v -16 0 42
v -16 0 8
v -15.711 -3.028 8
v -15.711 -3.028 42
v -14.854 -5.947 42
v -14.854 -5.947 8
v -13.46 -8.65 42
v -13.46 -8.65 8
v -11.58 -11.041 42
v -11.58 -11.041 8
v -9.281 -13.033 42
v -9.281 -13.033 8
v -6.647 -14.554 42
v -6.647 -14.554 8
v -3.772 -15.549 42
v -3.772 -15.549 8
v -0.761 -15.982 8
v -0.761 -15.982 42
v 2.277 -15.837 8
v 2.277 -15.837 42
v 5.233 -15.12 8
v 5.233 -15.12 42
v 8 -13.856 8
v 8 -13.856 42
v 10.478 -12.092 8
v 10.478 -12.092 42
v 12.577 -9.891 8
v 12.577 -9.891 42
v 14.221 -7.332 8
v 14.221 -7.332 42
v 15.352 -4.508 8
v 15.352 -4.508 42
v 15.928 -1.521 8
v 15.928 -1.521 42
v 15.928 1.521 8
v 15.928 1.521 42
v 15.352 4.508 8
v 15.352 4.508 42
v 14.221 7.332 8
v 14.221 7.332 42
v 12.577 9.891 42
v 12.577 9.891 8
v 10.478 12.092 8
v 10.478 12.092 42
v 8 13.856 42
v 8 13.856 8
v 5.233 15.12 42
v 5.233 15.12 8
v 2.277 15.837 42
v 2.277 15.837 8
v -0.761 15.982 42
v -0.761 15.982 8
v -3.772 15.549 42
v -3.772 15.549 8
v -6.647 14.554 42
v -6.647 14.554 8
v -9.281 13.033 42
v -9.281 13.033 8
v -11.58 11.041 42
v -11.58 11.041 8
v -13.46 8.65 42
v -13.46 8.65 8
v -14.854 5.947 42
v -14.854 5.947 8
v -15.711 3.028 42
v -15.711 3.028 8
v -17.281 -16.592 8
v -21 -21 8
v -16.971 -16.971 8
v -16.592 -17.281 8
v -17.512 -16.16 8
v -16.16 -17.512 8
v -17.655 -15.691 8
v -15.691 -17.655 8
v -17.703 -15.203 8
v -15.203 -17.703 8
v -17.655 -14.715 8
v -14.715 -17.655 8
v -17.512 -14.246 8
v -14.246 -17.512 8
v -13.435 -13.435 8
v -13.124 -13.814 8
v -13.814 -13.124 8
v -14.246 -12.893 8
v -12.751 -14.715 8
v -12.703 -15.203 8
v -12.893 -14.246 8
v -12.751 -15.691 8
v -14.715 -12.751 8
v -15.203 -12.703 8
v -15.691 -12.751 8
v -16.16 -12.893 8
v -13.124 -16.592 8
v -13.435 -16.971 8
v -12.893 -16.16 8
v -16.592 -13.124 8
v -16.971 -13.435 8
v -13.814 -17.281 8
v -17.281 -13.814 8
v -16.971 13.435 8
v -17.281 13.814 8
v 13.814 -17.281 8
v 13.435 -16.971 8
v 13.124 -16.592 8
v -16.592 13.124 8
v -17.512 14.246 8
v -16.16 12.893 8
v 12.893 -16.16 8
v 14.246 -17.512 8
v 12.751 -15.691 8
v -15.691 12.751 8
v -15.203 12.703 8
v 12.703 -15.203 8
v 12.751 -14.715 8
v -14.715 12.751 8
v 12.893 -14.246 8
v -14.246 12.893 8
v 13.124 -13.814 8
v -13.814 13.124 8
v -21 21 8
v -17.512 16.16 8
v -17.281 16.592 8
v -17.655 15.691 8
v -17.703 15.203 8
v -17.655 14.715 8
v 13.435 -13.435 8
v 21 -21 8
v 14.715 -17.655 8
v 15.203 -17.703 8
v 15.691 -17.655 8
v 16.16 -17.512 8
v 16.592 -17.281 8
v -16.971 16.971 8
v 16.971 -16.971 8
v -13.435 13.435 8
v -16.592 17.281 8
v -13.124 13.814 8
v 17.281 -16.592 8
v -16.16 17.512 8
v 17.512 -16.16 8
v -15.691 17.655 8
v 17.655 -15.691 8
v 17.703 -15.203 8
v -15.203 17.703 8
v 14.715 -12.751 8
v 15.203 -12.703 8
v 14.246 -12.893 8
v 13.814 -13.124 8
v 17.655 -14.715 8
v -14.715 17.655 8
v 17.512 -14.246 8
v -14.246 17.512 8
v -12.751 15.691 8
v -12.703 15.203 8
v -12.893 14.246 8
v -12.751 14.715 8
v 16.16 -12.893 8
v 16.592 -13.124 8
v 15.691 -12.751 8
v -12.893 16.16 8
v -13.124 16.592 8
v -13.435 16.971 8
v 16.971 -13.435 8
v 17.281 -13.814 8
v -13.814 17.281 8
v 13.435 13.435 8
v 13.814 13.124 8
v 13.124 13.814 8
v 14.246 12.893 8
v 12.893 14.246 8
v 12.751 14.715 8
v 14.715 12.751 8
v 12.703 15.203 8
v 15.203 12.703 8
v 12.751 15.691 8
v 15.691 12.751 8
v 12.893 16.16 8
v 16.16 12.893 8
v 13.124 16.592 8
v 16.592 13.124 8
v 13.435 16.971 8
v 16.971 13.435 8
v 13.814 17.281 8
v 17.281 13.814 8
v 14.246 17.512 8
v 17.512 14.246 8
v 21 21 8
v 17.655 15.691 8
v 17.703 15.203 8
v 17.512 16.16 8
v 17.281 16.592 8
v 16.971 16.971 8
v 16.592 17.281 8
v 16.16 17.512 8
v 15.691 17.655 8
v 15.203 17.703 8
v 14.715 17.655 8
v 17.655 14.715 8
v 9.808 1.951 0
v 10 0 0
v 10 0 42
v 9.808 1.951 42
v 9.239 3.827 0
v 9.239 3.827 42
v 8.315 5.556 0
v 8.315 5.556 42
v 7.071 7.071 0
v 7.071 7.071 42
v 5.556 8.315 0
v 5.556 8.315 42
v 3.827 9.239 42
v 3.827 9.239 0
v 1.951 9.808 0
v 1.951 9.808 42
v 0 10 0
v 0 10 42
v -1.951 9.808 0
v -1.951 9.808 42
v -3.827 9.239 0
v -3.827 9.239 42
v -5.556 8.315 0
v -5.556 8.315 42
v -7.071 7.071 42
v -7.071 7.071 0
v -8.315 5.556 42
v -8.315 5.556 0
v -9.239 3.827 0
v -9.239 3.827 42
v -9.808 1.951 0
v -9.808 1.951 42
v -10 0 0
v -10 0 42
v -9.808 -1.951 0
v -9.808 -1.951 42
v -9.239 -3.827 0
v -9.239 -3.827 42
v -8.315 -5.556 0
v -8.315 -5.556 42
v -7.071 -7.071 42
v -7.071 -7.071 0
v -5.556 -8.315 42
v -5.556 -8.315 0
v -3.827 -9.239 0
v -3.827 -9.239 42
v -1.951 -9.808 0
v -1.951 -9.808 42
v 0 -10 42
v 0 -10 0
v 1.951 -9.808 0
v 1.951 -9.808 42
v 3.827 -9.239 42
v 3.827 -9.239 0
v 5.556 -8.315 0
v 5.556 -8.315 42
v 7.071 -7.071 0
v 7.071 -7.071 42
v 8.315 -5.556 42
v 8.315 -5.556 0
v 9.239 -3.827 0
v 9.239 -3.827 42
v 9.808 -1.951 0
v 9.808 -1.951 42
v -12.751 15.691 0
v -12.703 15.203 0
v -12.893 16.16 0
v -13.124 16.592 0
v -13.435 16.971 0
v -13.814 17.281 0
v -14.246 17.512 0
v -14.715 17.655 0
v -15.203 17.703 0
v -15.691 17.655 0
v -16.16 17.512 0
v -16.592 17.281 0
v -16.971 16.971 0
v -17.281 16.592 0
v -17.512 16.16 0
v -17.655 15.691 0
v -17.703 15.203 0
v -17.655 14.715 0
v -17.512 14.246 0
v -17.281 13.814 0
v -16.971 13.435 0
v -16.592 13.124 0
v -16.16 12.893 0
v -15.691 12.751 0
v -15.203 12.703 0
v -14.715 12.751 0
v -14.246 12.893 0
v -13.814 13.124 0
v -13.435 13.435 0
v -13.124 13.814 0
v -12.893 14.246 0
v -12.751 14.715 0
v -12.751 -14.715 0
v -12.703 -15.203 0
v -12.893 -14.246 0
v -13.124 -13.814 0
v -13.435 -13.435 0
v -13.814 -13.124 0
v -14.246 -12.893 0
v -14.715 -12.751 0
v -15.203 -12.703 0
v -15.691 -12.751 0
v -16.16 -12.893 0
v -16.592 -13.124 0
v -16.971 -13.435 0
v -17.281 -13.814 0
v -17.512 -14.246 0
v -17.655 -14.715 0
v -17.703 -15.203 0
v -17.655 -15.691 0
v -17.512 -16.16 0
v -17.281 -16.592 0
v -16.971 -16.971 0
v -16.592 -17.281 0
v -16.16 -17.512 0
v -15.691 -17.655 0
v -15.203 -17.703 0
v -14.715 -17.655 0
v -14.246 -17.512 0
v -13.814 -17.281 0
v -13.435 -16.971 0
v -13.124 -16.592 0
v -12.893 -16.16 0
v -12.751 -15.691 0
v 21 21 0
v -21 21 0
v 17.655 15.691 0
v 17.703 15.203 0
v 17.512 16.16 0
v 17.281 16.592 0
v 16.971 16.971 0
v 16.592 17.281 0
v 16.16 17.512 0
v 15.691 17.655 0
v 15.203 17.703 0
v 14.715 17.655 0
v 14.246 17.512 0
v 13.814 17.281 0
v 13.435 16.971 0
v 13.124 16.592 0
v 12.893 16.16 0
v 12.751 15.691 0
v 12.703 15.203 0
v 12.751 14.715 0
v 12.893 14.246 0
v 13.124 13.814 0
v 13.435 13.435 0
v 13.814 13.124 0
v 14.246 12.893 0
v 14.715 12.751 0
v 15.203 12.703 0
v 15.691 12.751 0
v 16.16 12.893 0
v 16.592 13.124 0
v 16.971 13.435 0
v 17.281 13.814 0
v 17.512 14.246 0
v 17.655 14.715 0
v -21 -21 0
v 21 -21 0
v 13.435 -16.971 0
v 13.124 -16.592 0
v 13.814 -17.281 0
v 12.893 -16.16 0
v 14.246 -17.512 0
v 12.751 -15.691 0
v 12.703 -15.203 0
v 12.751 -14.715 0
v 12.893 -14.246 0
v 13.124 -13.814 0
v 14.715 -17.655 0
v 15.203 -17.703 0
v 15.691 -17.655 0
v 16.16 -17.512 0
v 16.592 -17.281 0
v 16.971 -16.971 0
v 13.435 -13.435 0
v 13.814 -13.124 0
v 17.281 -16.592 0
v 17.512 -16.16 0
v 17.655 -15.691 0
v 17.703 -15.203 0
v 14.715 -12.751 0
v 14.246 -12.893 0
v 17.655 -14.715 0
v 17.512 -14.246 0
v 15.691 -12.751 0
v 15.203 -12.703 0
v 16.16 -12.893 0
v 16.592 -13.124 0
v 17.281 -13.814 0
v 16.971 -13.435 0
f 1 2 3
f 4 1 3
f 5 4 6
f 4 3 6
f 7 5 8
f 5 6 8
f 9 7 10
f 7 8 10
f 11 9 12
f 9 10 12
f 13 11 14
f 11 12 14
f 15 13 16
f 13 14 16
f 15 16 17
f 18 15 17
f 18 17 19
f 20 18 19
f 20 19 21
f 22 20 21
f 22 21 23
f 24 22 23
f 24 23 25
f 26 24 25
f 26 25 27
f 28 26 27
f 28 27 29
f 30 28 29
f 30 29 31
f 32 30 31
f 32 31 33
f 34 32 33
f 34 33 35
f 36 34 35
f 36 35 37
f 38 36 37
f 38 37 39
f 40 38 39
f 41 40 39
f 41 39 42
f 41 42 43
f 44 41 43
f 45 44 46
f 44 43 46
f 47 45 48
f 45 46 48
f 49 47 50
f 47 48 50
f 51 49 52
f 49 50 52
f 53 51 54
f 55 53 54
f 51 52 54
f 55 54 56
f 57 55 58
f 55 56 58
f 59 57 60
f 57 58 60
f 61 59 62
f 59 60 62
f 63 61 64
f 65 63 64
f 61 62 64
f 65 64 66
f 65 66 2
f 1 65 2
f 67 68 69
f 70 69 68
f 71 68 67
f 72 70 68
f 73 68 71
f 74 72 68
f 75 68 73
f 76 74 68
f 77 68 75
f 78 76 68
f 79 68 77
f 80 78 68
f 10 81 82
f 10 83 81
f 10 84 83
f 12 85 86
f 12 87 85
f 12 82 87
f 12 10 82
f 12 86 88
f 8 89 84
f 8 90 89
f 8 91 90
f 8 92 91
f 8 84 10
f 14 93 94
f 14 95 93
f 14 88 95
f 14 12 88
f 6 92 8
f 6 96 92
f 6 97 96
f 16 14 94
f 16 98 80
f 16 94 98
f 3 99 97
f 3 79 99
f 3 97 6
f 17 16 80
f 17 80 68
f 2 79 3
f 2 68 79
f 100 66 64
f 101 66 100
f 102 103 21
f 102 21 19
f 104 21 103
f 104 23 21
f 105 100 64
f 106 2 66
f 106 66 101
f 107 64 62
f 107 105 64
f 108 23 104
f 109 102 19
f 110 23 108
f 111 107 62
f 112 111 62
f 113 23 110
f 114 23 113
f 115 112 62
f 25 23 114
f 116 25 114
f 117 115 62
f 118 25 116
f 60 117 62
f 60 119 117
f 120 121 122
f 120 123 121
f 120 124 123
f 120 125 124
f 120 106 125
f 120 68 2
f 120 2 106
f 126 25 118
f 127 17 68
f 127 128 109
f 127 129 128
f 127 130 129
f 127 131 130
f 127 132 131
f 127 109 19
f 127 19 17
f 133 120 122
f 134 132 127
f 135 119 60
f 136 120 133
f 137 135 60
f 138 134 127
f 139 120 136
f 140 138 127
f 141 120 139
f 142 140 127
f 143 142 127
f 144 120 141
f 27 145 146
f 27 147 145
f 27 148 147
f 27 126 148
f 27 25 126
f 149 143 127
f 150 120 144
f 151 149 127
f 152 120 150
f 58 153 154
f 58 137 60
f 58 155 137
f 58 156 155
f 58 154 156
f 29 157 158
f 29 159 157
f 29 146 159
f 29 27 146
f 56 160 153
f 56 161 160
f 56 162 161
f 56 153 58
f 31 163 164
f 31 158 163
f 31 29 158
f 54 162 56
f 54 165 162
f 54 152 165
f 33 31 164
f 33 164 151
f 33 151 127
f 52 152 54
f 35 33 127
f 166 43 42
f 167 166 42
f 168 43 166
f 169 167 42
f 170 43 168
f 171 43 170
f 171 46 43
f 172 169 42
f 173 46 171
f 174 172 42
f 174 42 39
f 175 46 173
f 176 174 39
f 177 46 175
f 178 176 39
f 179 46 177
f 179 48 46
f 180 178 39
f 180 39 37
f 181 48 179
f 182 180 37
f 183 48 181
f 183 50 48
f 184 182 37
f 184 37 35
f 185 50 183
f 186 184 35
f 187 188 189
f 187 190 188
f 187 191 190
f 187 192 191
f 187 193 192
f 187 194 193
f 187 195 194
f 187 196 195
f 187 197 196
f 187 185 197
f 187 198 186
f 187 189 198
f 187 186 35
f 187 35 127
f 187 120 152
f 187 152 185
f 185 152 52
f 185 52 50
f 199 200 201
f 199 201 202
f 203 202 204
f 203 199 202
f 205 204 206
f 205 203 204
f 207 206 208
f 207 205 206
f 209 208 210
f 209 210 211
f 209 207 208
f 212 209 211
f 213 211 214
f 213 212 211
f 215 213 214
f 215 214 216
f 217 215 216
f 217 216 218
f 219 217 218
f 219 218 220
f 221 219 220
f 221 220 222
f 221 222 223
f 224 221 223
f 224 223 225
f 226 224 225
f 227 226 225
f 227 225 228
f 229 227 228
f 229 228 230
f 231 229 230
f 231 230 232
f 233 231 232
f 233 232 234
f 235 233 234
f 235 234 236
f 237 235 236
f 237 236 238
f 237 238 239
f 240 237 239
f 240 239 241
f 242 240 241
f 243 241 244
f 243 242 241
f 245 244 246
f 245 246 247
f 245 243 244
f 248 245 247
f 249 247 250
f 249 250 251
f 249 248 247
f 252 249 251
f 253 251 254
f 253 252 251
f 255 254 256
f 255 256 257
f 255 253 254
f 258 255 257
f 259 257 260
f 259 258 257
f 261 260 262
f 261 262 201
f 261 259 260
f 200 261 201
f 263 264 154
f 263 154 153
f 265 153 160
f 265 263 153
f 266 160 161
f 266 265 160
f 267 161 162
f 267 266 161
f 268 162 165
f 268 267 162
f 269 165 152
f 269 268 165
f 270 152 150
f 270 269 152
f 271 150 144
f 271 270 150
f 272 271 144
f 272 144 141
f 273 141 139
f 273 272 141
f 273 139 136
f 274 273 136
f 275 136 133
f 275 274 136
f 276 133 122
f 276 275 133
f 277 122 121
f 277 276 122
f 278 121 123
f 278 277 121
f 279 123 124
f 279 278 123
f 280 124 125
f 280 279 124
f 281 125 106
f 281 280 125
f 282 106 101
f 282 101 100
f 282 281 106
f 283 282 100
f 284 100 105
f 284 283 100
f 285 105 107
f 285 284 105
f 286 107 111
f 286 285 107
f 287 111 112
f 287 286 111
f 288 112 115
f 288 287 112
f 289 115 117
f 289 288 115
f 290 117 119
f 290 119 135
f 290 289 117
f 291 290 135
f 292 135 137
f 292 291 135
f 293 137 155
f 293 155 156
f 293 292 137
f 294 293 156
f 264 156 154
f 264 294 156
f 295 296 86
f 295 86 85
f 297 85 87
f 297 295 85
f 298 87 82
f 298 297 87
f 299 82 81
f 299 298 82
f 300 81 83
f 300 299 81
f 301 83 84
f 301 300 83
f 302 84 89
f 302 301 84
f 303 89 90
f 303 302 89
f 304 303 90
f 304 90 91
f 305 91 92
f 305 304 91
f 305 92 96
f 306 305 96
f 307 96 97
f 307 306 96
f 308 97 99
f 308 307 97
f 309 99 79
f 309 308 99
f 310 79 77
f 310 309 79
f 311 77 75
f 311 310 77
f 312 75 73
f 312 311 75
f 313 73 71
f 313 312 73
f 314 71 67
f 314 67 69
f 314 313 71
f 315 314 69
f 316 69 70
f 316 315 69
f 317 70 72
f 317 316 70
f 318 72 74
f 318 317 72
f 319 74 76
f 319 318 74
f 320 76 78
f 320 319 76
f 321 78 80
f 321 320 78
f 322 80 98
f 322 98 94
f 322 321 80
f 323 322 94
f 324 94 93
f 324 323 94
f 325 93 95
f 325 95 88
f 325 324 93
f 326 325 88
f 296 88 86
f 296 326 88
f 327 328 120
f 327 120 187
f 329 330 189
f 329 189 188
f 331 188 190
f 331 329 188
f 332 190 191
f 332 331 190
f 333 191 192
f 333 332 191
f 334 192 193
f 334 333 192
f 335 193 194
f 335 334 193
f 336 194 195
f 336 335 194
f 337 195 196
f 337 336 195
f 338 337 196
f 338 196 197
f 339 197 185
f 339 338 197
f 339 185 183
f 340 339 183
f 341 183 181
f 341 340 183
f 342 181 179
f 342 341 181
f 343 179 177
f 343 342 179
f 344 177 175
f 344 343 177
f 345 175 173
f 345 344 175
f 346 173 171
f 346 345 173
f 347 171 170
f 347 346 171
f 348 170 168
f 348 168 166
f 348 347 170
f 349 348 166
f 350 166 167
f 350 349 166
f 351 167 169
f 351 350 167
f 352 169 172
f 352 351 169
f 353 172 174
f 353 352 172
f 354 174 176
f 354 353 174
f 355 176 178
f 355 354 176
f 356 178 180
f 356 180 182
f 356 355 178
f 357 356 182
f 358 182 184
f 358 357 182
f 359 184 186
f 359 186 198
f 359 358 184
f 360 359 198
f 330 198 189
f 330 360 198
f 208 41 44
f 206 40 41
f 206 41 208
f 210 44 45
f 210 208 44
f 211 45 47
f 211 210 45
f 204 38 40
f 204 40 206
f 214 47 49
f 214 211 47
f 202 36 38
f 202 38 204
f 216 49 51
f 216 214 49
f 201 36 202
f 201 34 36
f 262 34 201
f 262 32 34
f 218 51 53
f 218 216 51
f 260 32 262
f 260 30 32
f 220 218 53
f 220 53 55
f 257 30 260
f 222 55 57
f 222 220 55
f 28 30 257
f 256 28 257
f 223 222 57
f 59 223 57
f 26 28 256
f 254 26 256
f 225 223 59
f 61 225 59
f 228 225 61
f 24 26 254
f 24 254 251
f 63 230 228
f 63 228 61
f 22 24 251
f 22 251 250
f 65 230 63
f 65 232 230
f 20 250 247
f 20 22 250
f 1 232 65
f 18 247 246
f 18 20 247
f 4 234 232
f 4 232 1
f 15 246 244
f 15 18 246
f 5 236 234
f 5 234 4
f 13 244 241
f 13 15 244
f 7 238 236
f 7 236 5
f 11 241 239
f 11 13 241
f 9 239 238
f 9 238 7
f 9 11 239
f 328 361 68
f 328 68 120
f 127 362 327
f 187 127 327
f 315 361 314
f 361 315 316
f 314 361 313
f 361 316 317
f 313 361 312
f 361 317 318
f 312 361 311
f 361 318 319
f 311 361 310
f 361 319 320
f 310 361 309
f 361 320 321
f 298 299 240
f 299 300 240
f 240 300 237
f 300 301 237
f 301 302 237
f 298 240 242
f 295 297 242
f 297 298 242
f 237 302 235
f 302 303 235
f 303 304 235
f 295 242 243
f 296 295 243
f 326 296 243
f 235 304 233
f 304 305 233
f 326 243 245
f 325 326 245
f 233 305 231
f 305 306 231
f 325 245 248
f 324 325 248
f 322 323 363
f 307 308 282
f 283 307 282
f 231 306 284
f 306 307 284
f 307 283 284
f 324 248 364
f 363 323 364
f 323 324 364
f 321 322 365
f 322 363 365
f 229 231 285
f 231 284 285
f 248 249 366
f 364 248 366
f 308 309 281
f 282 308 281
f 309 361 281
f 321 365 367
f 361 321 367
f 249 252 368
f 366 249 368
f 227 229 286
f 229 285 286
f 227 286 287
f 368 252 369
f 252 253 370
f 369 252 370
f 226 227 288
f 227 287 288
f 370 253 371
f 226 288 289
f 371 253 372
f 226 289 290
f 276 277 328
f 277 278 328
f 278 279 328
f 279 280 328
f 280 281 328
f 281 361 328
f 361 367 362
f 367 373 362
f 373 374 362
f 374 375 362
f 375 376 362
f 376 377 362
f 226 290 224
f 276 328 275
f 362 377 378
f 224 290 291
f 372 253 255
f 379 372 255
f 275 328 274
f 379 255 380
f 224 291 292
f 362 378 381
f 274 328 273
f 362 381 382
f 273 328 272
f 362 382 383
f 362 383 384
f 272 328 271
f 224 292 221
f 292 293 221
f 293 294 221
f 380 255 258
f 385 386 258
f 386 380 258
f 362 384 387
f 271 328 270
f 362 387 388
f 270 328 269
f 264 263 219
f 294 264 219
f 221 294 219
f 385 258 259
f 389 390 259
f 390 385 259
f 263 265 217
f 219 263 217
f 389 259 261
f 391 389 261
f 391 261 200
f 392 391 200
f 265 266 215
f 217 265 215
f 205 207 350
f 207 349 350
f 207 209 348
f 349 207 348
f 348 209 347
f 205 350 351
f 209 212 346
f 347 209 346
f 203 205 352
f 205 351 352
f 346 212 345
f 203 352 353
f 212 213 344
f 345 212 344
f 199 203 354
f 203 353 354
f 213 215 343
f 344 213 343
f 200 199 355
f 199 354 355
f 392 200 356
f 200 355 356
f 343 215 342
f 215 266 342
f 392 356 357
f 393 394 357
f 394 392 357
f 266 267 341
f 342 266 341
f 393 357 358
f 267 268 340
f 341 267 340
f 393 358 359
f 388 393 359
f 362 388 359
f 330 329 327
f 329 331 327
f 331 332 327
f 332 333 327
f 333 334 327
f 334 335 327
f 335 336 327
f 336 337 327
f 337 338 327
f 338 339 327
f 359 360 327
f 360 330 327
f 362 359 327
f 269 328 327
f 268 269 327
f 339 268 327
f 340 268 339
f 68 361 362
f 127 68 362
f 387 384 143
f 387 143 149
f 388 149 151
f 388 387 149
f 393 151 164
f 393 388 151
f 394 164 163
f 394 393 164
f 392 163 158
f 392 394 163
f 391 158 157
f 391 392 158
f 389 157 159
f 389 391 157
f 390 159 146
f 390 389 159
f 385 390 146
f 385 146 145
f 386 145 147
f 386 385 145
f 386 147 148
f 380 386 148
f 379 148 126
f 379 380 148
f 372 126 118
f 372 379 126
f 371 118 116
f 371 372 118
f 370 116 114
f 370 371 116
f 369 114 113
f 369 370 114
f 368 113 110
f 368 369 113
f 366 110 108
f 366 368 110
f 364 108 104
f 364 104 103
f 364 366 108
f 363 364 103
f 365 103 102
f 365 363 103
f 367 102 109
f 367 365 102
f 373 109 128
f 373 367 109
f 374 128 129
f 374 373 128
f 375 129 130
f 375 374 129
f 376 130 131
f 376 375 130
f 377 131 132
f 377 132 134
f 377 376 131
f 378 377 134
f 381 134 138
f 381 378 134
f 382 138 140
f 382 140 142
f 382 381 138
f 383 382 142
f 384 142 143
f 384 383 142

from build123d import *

# Parameters (mm, degrees)
SKETCH_1_W      = 42
SKETCH_1_H      = 42
SKETCH_1_R      = 2.5
SKETCH_1_R_2    = 10
EXTRUDE_1_DEPTH = 8
SKETCH_1_3_R    = 16
SKETCH_1_3_R_2  = 10
EXTRUDE_2_DEPTH = 42


with BuildPart() as part:
    # 草图1 → 凸台-拉伸1 (new body)
    with BuildSketch(Plane.XY):
        Rectangle(SKETCH_1_W, SKETCH_1_H)
        with Locations((-15.202795796, -15.202795796)):
            Circle(SKETCH_1_R, mode=Mode.SUBTRACT)
        with Locations((15.202795796, -15.202795796)):
            Circle(SKETCH_1_R, mode=Mode.SUBTRACT)
        with Locations((-15.202795796, 15.202795796)):
            Circle(SKETCH_1_R, mode=Mode.SUBTRACT)
        with Locations((15.202795796, 15.202795796)):
            Circle(SKETCH_1_R, mode=Mode.SUBTRACT)
        Circle(SKETCH_1_R_2, mode=Mode.SUBTRACT)
    extrude(amount=EXTRUDE_1_DEPTH)

    # 草图1<3> → 凸台-拉伸2 (add)
    with BuildSketch(Plane.XY):
        Circle(SKETCH_1_3_R)
        Circle(SKETCH_1_3_R_2, mode=Mode.SUBTRACT)
    extrude(amount=EXTRUDE_2_DEPTH)


solid = part.part
